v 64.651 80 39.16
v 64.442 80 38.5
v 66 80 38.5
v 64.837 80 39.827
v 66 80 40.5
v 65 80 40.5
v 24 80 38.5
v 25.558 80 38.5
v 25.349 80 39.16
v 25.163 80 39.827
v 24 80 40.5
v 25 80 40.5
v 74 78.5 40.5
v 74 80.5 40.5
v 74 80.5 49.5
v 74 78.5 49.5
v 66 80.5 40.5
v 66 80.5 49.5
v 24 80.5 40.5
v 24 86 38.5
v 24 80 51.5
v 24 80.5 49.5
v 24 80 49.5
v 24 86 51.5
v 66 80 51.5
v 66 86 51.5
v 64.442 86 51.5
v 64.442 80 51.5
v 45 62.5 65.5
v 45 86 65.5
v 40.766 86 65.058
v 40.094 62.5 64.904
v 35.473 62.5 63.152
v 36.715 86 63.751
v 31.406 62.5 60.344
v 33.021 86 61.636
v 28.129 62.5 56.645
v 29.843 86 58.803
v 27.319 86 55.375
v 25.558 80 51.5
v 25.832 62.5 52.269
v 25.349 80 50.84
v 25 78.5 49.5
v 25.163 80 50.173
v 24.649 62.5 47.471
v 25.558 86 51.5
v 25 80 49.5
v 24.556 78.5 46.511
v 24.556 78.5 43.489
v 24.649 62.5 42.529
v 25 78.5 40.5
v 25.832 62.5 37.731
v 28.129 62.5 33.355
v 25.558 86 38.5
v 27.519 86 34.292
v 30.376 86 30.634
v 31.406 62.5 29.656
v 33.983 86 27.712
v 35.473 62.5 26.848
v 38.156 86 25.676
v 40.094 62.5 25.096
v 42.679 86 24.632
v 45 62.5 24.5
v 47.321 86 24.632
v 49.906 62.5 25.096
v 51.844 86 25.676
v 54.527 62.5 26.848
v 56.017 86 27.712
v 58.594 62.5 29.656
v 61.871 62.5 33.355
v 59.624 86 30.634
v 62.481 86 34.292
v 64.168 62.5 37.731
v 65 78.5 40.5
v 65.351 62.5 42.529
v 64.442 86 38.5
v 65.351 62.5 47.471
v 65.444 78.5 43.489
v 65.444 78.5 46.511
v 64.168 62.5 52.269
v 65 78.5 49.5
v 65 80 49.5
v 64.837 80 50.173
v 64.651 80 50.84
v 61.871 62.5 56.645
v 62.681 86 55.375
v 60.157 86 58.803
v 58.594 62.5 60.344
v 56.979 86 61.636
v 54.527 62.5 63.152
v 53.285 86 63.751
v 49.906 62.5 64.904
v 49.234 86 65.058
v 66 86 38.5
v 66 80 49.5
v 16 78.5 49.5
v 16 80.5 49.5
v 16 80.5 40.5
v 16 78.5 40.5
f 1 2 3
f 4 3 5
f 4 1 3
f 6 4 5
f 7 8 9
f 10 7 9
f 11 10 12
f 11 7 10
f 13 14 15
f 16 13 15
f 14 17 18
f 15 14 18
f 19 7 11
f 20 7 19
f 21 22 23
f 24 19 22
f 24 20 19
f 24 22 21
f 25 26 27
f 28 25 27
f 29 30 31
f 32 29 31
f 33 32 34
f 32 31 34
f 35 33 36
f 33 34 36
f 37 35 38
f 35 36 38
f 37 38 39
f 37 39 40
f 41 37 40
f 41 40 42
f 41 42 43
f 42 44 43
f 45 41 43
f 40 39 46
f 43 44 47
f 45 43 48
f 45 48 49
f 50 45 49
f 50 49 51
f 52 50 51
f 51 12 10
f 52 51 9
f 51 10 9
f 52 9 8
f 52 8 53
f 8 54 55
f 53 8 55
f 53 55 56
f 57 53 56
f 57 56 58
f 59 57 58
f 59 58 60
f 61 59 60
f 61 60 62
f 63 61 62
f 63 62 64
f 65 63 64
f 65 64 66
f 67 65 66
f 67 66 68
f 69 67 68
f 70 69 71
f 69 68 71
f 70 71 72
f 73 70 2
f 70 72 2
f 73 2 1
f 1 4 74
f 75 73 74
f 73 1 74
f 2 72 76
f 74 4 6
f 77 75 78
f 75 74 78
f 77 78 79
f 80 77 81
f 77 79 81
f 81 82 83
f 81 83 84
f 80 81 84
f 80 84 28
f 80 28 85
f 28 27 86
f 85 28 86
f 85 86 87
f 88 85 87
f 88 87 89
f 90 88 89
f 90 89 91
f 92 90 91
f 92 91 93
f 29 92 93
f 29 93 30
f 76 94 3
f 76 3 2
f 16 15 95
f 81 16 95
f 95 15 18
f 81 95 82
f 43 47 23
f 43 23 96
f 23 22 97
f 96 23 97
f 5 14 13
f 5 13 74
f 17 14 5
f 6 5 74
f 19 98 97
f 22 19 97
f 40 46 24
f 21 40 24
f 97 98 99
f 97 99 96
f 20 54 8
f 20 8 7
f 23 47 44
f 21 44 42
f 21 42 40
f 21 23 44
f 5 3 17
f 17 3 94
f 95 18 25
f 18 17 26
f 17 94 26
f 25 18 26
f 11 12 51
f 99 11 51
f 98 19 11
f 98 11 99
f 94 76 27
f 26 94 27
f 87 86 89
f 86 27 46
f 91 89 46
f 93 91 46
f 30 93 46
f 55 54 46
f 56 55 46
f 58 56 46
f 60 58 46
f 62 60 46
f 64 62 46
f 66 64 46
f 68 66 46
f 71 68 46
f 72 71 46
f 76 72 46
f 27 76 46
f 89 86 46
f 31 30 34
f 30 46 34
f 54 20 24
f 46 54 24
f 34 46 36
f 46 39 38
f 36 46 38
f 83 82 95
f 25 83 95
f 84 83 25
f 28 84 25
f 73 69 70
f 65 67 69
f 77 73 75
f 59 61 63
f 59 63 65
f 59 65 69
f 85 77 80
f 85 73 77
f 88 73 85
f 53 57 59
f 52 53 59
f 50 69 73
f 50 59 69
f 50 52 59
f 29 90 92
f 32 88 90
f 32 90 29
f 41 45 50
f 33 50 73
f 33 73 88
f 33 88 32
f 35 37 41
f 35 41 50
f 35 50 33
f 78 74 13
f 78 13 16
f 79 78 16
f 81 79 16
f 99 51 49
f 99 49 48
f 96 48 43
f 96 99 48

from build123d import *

# Parameters (mm, degrees)
BOX042_W                  = 13
BOX042_H                  = 42
BOX042_DEPTH              = 6
BOX043_W                  = 9
BOX043_H                  = 58
BOX043_DEPTH              = 2
CYLINDER024_R             = 20.5
CYLINDER024_DEPTH         = 23.5
FUSION001_PITCH_ANGLE     = -90
FUSION001_PLACEMENT_ANGLE = 90


with BuildPart() as cube022:
    # Box042 → Box042 (new body)
    with BuildSketch(Plane(origin=(-6.5, -21, 0), x_dir=(1, 0, 0), z_dir=(0, 0, 1))):
        with Locations((6.5, 21)):
            Rectangle(BOX042_W, BOX042_H)
    extrude(amount=BOX042_DEPTH)


with BuildPart() as cube023:
    # Box043 → Box043 (new body)
    with BuildSketch(Plane(origin=(-4.5, -29, 5.5), x_dir=(1, 0, 0), z_dir=(0, 0, 1))):
        with Locations((4.5, 29)):
            Rectangle(BOX043_W, BOX043_H)
    extrude(amount=BOX043_DEPTH)


with BuildPart() as speaker:
    # Cylinder024 → Cylinder024 (new body)
    with BuildSketch(Plane.XY):
        Circle(CYLINDER024_R)
    extrude(amount=CYLINDER024_DEPTH)

    # Fusion001: union Cube022, Cube023
    add(cube022.part)
    add(cube023.part)


with BuildPart() as speaker_1:
    # Fusion001 pitch: moved
    add(speaker.part.rotate(Axis((0, 0, 0), (0, 1, 0)), FUSION001_PITCH_ANGLE))


with BuildPart() as speaker_2:
    # Fusion001 placement: moved
    add(speaker_1.part.moved(Location((45, 86, 45))).rotate(Axis((45, 86, 45), (0, 0, 1)), FUSION001_PLACEMENT_ANGLE))


solid = speaker_2.part
